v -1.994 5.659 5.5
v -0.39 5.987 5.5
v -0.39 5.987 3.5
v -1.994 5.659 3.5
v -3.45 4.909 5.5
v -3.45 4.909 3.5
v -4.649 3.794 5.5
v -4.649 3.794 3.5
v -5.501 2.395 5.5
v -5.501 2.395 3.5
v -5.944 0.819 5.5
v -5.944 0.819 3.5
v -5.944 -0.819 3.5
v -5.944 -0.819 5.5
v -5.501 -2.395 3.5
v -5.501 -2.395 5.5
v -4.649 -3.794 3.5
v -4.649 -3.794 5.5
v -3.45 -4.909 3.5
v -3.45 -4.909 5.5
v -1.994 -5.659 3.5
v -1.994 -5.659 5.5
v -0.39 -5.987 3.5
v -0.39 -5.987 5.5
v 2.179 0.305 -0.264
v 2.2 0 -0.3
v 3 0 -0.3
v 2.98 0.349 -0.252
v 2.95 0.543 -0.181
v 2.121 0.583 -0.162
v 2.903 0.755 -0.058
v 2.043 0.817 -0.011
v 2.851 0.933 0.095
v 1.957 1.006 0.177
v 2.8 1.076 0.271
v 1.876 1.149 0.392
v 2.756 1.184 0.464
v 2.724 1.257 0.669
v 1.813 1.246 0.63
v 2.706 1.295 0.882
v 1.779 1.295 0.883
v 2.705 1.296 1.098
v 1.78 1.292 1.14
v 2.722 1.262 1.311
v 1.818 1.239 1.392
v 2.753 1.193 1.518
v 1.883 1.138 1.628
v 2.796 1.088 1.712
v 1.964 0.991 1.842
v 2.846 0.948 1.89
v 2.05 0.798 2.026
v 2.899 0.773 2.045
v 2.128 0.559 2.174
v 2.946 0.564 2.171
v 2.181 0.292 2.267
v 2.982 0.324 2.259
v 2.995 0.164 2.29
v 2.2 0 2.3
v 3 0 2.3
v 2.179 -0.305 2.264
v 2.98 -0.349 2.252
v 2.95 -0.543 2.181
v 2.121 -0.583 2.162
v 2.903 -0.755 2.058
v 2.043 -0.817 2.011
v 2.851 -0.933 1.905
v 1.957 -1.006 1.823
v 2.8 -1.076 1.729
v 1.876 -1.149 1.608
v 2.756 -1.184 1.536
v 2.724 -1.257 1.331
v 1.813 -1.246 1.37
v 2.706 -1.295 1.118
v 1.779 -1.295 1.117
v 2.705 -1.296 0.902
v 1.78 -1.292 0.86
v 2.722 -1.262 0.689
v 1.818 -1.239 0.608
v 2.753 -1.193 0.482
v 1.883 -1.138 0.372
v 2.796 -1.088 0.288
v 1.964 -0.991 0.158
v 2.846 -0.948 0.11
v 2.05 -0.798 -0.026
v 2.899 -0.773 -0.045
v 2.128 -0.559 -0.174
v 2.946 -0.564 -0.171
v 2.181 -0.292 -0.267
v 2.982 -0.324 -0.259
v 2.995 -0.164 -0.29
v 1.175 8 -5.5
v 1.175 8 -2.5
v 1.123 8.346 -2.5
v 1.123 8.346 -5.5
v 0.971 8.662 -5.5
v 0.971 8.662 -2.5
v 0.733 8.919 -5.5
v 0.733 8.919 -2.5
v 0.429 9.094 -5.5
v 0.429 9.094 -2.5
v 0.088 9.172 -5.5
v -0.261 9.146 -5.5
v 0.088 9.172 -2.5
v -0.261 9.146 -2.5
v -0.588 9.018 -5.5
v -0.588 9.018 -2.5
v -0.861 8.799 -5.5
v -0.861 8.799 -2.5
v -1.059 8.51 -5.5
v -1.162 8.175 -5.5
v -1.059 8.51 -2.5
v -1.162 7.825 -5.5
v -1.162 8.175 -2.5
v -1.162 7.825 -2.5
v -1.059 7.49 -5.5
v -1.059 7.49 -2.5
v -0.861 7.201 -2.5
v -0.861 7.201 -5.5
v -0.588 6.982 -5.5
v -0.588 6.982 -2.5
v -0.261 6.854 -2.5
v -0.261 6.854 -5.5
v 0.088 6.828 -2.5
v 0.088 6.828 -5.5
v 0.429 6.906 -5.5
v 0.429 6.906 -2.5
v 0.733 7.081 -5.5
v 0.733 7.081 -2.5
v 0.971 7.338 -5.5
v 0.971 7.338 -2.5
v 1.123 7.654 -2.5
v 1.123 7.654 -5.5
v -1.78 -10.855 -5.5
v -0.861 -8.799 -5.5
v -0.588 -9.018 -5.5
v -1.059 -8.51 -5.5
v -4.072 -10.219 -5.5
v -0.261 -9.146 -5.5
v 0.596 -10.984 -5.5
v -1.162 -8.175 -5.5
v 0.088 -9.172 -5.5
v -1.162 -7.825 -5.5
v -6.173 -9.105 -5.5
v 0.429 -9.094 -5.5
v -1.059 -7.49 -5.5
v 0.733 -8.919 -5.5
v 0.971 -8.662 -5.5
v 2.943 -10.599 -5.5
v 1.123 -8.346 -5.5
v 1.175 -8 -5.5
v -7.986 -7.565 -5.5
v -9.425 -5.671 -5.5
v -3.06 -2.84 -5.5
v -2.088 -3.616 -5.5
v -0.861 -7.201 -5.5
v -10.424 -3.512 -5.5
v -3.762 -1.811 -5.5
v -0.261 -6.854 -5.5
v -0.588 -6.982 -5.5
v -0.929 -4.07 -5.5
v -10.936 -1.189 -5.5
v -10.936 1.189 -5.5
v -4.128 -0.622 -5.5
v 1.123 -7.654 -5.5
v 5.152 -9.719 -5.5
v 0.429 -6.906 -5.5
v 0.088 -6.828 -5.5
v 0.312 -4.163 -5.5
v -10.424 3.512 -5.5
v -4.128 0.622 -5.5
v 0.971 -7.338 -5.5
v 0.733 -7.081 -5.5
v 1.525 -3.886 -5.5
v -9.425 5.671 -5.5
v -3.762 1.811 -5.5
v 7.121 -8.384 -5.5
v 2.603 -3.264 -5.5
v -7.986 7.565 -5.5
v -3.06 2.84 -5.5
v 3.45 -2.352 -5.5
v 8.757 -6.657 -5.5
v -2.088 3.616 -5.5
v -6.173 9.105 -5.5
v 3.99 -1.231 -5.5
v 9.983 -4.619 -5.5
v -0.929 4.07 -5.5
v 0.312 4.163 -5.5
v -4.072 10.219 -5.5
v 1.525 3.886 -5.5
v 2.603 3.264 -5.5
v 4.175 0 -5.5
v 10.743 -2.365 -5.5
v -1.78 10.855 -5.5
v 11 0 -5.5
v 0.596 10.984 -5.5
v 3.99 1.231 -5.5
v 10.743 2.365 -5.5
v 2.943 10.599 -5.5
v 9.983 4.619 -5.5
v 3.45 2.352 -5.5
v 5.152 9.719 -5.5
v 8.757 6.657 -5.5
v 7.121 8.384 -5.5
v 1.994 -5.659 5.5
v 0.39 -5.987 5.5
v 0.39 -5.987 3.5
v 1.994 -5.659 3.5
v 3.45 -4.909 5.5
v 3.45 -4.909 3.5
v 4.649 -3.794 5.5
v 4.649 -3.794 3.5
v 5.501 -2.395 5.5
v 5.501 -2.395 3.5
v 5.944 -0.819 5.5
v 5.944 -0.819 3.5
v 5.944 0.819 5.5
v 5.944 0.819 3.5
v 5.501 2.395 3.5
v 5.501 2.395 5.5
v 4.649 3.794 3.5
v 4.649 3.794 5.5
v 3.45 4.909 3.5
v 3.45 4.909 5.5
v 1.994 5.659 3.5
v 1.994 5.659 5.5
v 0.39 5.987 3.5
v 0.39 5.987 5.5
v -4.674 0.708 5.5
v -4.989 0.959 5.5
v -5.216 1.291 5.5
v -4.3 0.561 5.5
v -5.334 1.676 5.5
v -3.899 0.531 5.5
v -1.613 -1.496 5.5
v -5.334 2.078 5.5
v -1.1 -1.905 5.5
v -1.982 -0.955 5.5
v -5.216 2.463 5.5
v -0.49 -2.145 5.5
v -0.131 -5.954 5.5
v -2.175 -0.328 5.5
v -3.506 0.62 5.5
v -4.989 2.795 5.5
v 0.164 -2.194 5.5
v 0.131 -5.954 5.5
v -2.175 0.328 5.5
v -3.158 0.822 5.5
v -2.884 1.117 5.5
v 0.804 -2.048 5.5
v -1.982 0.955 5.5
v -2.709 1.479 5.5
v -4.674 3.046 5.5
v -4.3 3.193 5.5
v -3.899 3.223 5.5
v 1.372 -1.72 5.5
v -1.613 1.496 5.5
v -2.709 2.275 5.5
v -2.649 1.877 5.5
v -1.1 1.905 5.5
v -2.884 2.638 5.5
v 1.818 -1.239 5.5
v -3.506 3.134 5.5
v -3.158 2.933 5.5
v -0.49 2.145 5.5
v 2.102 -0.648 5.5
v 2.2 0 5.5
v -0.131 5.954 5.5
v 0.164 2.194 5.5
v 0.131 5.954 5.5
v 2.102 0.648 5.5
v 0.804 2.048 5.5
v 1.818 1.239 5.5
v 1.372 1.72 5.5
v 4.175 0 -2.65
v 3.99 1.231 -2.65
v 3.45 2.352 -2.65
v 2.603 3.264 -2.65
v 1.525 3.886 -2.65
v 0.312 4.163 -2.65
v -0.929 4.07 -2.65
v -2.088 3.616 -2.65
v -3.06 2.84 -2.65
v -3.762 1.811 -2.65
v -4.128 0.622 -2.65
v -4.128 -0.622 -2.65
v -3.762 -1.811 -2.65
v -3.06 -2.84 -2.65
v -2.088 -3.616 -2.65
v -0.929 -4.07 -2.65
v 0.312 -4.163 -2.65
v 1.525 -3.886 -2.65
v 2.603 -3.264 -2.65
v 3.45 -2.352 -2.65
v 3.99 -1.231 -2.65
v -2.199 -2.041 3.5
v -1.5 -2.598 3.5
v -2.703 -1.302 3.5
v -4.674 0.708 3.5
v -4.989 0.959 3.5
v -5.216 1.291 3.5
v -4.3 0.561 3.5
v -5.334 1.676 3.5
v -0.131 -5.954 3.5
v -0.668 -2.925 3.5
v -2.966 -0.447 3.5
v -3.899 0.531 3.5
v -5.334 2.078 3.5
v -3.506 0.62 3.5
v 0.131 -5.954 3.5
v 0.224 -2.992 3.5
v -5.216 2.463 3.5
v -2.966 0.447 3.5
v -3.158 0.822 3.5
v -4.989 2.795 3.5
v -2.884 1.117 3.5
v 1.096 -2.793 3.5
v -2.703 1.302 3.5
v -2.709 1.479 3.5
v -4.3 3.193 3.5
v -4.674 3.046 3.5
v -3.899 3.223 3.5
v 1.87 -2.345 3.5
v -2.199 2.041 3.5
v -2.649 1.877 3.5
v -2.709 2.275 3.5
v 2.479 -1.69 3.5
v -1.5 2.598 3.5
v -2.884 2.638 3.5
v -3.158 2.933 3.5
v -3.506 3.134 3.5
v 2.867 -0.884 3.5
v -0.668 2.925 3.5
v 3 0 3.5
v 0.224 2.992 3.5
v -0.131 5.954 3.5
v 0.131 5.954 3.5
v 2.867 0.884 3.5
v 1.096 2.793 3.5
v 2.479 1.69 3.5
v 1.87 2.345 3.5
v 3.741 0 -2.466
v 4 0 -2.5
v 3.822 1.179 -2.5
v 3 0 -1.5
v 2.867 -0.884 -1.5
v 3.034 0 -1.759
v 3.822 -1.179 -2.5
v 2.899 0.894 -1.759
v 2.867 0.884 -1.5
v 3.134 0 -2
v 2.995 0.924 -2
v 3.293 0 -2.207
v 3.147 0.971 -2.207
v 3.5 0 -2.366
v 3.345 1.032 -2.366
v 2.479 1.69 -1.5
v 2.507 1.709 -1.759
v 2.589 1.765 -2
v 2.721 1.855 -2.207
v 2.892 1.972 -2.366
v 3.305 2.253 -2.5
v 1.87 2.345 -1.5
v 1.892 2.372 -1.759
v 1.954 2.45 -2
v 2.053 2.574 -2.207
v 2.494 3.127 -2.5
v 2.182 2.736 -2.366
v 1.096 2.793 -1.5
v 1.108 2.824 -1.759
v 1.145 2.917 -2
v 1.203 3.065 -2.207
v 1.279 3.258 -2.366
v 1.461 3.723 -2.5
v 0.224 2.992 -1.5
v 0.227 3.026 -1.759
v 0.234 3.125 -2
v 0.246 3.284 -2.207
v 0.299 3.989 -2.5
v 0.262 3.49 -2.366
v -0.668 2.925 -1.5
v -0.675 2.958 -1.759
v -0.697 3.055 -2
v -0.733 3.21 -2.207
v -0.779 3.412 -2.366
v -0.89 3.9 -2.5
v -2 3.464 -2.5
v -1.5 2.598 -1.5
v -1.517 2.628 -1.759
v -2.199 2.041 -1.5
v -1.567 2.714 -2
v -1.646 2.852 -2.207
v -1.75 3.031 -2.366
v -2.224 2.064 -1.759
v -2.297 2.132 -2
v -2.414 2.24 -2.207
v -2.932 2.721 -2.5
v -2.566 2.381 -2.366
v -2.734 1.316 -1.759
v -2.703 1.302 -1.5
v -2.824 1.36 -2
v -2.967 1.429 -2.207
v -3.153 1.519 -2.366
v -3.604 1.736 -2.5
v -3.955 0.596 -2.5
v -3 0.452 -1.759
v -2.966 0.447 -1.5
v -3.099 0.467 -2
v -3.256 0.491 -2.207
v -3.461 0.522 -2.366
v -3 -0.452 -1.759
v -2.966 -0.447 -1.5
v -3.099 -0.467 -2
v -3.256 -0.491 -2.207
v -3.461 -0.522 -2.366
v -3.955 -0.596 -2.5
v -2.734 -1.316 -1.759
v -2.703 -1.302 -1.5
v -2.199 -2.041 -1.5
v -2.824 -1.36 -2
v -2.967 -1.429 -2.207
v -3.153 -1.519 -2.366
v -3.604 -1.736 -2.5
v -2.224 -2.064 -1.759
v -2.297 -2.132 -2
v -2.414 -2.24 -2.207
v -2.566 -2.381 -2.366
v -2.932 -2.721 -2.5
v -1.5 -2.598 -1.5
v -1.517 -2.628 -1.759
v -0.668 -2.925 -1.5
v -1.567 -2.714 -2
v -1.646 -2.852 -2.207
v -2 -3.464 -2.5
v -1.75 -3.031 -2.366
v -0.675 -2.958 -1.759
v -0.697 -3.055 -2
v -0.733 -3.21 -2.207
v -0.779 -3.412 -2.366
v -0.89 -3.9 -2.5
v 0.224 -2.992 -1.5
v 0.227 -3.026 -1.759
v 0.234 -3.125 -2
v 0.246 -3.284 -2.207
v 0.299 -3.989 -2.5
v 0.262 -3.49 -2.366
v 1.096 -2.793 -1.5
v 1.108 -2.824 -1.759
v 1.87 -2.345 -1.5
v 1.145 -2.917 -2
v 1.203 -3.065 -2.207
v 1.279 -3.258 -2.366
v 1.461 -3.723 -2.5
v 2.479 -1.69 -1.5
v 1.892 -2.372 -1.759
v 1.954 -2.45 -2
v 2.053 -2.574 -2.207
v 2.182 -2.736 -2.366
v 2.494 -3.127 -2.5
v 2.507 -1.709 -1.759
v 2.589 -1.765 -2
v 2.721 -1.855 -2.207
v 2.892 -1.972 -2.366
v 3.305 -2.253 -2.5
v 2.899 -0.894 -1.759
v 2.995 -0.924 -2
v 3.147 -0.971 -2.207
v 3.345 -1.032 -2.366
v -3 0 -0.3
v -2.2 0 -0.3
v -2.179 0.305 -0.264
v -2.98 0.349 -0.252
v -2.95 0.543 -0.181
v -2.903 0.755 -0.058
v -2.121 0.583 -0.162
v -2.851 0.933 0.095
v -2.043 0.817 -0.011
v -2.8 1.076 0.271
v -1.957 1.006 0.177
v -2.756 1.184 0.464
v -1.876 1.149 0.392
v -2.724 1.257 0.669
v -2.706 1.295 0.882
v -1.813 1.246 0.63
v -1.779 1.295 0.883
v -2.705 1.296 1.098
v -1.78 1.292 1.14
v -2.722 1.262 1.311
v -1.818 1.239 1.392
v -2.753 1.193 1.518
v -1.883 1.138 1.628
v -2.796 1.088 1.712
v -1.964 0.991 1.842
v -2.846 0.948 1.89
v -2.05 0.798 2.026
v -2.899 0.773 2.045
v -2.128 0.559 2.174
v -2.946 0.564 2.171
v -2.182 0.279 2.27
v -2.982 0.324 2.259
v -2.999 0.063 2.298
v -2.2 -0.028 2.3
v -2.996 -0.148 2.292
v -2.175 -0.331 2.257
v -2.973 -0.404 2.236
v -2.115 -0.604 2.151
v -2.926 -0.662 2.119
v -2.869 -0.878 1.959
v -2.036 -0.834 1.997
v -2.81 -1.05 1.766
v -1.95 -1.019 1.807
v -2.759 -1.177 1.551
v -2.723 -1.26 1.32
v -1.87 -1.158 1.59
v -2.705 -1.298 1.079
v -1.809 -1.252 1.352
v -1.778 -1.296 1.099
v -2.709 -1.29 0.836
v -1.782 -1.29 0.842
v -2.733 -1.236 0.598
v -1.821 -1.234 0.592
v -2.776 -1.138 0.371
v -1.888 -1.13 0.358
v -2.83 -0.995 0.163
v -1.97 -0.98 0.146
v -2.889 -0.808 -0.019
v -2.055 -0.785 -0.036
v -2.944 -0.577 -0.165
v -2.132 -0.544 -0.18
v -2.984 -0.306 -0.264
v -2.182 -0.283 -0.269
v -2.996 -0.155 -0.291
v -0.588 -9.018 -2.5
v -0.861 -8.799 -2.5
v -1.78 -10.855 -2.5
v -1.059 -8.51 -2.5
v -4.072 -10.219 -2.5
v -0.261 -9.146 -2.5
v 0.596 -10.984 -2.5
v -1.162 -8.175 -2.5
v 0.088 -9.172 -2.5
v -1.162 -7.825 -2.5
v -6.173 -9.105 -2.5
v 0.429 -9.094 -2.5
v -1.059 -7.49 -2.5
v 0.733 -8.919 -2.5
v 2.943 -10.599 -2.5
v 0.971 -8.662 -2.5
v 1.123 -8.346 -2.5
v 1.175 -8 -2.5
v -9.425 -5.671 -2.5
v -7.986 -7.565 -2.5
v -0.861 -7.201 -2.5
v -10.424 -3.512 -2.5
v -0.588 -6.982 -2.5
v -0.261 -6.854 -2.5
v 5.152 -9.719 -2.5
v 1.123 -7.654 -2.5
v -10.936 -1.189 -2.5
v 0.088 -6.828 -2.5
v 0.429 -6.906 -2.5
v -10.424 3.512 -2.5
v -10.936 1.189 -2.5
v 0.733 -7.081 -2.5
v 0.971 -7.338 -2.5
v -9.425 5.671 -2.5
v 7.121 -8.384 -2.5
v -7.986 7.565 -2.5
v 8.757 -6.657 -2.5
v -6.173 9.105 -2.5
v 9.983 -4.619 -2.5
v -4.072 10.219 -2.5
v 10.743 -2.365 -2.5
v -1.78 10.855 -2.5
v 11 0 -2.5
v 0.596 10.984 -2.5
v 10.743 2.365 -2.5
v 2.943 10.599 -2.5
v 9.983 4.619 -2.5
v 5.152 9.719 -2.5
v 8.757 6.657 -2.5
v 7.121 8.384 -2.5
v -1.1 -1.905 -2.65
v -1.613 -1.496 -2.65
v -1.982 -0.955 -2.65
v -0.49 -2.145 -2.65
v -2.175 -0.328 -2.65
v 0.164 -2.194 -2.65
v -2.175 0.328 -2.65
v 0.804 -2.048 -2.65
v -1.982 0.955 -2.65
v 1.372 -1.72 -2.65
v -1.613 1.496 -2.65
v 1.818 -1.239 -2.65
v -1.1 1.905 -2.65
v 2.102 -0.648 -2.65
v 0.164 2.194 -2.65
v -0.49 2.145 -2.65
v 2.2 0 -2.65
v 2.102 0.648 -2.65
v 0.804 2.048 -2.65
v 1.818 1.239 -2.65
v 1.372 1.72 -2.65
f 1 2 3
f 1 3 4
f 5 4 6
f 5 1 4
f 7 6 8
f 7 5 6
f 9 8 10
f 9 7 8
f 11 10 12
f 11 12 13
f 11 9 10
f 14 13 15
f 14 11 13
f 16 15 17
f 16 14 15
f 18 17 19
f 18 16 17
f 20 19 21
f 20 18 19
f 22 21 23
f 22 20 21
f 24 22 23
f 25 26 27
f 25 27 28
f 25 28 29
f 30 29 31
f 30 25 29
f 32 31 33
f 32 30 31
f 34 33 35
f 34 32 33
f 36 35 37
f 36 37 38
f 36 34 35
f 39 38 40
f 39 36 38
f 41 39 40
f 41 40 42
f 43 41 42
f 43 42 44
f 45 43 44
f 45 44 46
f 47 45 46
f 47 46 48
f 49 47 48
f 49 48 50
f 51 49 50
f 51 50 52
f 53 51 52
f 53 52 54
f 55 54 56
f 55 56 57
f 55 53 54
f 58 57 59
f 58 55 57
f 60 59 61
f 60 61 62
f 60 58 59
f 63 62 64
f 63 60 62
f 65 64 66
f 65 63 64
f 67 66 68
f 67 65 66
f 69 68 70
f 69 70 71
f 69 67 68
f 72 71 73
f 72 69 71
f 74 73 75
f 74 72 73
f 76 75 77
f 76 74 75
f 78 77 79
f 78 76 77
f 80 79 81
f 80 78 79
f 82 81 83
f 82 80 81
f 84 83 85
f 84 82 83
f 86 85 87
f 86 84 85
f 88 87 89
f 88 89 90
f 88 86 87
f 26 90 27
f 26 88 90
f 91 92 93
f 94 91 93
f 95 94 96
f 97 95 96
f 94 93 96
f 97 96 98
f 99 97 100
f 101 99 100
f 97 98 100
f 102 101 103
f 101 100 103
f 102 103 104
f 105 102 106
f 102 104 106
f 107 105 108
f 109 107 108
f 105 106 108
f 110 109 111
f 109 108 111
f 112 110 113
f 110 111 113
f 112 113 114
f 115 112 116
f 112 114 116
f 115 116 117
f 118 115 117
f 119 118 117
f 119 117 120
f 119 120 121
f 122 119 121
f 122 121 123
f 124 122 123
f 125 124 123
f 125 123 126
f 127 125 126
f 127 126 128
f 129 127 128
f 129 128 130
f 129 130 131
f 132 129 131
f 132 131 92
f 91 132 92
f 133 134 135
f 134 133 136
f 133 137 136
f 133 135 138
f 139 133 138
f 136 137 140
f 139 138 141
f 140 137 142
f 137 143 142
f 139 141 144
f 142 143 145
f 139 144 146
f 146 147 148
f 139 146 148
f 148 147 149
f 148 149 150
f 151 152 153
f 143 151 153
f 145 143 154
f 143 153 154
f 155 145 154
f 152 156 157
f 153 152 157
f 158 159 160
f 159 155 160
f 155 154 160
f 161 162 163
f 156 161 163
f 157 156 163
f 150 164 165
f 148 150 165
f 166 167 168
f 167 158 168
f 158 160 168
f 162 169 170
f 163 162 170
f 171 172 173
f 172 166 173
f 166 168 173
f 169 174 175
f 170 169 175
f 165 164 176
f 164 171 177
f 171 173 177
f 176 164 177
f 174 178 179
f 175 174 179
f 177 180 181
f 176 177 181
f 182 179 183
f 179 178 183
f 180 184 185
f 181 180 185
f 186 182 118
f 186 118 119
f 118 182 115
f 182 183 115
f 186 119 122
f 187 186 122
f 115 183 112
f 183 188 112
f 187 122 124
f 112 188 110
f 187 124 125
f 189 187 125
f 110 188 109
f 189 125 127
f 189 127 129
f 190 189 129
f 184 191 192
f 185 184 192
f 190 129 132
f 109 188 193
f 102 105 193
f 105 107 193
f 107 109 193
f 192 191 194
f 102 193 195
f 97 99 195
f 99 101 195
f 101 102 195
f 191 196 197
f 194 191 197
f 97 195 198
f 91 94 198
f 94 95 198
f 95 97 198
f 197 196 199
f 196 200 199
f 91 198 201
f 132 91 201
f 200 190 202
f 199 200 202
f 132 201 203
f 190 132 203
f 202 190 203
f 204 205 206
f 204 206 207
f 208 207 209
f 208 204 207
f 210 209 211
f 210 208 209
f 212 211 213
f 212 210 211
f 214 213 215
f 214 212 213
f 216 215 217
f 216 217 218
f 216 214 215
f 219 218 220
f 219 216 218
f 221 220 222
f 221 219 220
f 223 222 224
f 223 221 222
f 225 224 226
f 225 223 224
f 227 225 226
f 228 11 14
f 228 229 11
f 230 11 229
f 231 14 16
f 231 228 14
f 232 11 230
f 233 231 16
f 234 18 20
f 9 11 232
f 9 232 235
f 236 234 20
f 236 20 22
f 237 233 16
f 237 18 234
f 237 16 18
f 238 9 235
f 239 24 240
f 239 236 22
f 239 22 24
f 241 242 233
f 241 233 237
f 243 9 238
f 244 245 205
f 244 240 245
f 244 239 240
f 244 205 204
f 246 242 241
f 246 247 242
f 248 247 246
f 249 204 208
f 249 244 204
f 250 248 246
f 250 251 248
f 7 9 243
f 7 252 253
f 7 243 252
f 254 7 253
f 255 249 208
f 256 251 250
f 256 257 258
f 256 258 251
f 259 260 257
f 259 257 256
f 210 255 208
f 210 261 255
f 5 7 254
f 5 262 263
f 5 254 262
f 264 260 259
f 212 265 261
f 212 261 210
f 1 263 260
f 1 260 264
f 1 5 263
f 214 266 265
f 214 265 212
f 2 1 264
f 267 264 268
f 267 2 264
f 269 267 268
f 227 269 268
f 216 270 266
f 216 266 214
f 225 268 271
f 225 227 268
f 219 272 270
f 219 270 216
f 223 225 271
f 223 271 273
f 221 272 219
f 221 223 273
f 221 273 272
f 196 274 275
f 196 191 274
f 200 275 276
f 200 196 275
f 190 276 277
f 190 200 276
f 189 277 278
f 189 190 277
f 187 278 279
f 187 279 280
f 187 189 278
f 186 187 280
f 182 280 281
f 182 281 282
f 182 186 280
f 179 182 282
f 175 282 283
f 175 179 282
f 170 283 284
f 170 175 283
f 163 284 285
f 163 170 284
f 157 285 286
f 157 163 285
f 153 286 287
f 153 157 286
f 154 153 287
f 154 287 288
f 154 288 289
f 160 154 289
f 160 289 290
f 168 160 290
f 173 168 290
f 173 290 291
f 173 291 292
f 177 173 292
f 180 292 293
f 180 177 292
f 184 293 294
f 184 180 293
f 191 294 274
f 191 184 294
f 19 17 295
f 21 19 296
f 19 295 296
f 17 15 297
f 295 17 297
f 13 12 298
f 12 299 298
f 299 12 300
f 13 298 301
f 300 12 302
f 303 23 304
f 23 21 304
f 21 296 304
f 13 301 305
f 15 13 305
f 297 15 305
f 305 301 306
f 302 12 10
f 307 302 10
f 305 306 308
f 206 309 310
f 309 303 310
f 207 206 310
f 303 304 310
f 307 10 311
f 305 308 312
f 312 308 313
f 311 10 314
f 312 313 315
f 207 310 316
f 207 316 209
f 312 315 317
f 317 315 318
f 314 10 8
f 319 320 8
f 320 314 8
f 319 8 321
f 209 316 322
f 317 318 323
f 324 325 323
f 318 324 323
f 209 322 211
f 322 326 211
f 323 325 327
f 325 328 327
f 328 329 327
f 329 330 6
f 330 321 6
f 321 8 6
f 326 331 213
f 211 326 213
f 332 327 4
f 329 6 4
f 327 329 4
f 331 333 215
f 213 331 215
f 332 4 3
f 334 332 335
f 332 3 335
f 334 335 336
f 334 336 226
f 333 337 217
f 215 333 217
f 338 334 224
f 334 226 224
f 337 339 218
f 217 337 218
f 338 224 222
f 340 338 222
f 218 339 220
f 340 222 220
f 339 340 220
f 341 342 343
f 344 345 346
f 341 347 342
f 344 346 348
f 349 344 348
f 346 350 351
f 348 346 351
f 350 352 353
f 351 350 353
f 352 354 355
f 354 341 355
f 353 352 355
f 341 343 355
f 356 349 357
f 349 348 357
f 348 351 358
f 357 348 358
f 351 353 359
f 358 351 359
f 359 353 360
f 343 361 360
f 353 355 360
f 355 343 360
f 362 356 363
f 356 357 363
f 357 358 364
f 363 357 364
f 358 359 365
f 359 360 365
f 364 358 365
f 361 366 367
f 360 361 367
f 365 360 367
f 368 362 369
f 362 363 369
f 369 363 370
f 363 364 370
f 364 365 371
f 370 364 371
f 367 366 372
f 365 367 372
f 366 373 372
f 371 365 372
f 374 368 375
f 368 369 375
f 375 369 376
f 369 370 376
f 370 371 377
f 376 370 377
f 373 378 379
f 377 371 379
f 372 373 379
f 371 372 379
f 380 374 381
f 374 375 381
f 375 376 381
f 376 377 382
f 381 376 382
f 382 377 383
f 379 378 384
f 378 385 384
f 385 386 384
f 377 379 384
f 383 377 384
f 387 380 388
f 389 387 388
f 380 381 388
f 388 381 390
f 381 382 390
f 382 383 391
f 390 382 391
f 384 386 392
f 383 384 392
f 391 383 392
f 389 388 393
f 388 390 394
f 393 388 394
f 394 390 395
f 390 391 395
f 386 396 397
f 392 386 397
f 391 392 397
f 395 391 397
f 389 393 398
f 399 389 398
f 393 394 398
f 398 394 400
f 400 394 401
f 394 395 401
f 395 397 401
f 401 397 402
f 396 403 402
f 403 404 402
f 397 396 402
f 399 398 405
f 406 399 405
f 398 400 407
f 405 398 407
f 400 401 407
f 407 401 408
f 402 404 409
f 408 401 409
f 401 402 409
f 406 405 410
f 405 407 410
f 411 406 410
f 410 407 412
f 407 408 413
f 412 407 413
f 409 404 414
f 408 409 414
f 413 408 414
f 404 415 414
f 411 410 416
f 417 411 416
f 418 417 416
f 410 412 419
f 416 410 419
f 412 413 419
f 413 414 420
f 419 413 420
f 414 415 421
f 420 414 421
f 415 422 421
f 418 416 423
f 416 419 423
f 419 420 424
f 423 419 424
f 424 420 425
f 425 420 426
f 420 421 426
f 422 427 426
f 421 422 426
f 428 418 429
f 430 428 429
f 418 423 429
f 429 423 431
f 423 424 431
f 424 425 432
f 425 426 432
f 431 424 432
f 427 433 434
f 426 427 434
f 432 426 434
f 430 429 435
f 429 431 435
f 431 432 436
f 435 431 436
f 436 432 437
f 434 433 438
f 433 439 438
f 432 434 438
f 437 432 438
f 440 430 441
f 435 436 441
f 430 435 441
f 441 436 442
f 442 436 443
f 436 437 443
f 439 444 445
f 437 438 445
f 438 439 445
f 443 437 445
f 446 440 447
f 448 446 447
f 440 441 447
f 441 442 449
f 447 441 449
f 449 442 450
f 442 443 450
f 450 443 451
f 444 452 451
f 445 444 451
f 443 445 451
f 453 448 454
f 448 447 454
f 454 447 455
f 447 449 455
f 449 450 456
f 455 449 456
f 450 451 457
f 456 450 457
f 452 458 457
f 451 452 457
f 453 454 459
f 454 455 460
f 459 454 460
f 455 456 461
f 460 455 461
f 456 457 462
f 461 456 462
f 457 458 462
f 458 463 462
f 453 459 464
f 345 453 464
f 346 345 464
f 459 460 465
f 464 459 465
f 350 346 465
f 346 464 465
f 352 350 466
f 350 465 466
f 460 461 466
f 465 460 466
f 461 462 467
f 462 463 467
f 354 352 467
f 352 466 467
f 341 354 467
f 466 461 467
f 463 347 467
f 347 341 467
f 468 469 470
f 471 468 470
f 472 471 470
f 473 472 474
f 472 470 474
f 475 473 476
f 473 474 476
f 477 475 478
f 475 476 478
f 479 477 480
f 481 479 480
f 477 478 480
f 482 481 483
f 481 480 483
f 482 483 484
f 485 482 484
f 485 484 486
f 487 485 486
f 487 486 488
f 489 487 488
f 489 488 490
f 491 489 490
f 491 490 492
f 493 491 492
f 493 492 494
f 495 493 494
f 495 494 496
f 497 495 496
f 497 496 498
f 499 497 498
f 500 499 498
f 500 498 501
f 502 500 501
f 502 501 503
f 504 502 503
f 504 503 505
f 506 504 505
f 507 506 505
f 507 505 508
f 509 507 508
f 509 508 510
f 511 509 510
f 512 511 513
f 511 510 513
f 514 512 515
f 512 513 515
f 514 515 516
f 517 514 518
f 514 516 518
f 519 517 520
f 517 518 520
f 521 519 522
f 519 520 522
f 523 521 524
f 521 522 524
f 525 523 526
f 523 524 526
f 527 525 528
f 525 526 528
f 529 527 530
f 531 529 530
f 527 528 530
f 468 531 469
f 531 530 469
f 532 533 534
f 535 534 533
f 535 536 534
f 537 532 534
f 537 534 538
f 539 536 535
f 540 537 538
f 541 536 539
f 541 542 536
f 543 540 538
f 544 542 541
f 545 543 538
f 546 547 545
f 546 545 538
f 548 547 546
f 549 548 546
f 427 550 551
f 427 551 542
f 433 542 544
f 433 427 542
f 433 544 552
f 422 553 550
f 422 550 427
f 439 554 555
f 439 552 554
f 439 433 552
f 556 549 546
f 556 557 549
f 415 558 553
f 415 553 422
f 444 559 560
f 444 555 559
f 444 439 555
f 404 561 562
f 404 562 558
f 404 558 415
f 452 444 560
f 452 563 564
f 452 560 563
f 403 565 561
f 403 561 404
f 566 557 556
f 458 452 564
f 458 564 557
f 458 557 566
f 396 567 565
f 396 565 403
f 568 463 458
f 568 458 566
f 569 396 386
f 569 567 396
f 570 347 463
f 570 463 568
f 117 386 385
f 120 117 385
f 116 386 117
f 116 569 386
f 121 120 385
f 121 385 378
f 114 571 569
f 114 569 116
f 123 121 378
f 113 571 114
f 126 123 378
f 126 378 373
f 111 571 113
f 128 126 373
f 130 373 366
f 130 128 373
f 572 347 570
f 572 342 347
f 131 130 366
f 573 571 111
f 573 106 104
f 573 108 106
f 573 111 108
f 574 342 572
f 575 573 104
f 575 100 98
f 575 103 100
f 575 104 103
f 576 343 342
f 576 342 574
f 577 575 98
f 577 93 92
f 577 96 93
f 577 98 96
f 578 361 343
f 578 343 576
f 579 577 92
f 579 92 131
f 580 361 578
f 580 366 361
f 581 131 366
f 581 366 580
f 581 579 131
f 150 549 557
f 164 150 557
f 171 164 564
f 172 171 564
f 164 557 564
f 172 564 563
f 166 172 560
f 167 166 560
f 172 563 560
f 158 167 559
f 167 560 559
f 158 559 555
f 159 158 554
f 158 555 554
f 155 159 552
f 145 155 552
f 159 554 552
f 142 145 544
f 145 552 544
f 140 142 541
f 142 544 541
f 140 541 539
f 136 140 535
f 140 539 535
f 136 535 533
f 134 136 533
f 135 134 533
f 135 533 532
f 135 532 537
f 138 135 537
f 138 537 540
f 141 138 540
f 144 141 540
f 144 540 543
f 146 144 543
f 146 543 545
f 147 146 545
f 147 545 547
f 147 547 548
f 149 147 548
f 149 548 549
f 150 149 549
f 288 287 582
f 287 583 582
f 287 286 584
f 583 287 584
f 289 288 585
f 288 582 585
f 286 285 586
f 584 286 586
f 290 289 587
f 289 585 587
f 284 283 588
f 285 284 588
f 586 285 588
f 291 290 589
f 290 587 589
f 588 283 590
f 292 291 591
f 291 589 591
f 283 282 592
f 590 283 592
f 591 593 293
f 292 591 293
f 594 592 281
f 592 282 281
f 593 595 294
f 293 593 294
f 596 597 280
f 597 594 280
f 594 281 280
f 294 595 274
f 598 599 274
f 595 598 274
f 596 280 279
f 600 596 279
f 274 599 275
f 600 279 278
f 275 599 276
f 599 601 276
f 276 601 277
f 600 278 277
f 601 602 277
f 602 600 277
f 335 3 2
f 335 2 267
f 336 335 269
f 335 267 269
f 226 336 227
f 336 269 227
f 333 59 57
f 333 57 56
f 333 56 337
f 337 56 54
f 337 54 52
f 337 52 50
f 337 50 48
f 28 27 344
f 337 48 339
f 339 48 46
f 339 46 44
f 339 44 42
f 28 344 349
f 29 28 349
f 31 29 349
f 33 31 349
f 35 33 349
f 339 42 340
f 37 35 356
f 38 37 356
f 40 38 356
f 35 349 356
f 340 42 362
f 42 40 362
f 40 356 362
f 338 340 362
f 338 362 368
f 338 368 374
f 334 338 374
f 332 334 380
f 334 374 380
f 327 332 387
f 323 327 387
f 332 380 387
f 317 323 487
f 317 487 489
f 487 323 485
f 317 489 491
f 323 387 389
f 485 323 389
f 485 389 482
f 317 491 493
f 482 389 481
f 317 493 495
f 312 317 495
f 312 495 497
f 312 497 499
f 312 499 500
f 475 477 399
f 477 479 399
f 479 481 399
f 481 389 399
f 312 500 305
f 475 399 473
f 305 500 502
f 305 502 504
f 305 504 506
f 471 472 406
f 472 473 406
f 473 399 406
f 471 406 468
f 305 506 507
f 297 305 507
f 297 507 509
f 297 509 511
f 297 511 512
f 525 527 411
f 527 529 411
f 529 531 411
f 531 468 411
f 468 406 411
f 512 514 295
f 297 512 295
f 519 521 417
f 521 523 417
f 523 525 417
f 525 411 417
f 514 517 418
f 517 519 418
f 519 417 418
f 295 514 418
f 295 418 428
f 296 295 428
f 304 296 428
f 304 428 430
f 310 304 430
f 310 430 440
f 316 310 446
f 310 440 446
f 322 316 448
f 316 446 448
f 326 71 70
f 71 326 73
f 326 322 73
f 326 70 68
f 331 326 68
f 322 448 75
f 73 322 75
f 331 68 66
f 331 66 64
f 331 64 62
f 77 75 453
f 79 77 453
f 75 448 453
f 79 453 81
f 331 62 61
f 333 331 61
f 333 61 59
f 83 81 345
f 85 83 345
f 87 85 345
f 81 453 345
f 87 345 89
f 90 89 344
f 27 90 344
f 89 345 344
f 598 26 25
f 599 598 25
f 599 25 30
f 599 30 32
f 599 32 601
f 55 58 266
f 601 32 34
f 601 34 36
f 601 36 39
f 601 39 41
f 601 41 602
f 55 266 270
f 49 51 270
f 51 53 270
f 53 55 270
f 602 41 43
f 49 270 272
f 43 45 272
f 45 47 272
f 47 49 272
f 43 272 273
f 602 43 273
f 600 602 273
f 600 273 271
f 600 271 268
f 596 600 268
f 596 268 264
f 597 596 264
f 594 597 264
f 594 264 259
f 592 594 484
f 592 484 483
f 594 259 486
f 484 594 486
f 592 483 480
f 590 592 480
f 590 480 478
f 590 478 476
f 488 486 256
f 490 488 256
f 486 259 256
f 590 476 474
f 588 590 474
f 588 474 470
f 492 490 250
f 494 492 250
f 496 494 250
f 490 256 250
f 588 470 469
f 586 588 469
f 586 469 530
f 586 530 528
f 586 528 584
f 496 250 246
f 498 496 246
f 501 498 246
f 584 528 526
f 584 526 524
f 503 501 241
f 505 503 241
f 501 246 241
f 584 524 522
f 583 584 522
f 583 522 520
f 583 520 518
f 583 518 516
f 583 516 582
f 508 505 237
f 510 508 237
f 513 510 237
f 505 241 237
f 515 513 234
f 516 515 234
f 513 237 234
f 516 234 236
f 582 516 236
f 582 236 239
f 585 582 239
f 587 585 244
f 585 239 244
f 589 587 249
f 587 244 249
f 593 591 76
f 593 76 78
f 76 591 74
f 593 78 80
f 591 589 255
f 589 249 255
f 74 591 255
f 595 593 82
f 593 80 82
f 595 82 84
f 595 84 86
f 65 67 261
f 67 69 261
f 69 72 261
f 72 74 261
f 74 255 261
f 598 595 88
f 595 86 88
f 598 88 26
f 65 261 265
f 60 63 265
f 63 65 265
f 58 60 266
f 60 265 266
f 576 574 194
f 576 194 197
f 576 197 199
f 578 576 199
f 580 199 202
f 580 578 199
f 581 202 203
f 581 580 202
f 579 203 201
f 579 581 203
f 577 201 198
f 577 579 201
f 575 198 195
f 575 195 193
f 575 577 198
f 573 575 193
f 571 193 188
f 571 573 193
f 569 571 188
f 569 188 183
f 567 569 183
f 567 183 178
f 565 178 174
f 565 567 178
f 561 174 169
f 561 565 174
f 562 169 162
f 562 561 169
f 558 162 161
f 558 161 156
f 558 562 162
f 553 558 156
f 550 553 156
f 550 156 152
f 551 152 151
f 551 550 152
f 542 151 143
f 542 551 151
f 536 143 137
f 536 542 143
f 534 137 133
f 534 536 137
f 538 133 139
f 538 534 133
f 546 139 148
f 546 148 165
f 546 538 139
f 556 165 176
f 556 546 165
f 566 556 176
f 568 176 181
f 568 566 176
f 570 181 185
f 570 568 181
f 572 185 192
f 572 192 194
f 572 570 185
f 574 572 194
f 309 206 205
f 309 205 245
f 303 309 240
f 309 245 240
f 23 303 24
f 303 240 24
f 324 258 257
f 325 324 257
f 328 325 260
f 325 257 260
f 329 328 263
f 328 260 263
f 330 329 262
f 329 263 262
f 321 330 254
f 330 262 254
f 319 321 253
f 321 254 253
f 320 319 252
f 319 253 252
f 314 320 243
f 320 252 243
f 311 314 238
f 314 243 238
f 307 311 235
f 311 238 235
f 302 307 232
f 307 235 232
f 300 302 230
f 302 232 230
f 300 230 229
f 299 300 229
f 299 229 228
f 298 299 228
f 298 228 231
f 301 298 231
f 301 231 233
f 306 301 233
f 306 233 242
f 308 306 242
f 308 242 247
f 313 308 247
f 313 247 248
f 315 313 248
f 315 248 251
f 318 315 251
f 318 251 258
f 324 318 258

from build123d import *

# Parameters (mm, degrees)
SKETCH1_R                = 11
SKETCH1_R_2              = 4.175
MAIN_BODY_DEPTH          = 5.5
SKETCH2_R                = 4.175
SKETCH2_R_2              = 2.2
MAIN_BOLT_SURFACE_DEPTH  = 8.15
SKETCH7_R                = 1.175
CUT_EXTRUDE4_DEPTH       = 12
SKETCH8_R                = 2.05
CUT_EXTRUDE5_DEPTH       = 2
CUT_EXTRUDE9_START       = -2.5
SKETCH11_R               = 11
SKETCH11_R_2             = 3
CUT_EXTRUDE9_DEPTH       = 6
CUT_EXTRUDE10_REACH      = 13
SKETCH10_R               = 11
SKETCH10_R_2             = 6
FILLET2_R                = 1
SKETCH12_R               = 1.3
CUT_EXTRUDE12_DEPTH      = 12
CUT_EXTRUDE12_DEPTH_BACK = 12
SKETCH13_R               = 1.35
CUT_EXTRUDE13_DEPTH      = 5.5


with BuildPart() as part:
    # Sketch1 → Main Body (new body, symmetric)
    with BuildSketch(Plane.XY):
        Circle(SKETCH1_R)
        Circle(SKETCH1_R_2, mode=Mode.SUBTRACT)
    extrude(amount=MAIN_BODY_DEPTH, both=True)

    # Sketch2 → Main Bolt Surface (add)
    with BuildSketch(Plane.XY.offset(5.5)):
        Circle(SKETCH2_R)
        Circle(SKETCH2_R_2, mode=Mode.SUBTRACT)
    extrude(amount=-MAIN_BOLT_SURFACE_DEPTH)

    # Sketch7 → Cut-Extrude4 (cut, through all)
    with BuildSketch(Plane.XY.offset(5.5)):
        with Locations((0, -8)):
            Circle(SKETCH7_R)
        with Locations((0, 8)):
            Circle(SKETCH7_R)
    extrude(amount=-CUT_EXTRUDE4_DEPTH, mode=Mode.SUBTRACT)

    # Sketch8 → Cut-Extrude5 (cut)
    with BuildSketch(Plane.XY.offset(5.5)):
        with Locations((0, 8)):
            Circle(SKETCH8_R)
        with Locations((0, -8)):
            Circle(SKETCH8_R)
    extrude(amount=-CUT_EXTRUDE5_DEPTH, mode=Mode.SUBTRACT)

    # Sketch11 → Cut-Extrude9 (cut)
    with BuildSketch(Plane.XY.offset(CUT_EXTRUDE9_START)):
        Circle(SKETCH11_R)
        Circle(SKETCH11_R_2, mode=Mode.SUBTRACT)
    extrude(amount=CUT_EXTRUDE9_DEPTH, mode=Mode.SUBTRACT)

    # Sketch10 → Cut-Extrude10 (cut, up to next)
    with BuildSketch(Plane.XY.offset(5.5), mode=Mode.PRIVATE) as cut_extrude10_sk1:
        Circle(SKETCH10_R)
        Circle(SKETCH10_R_2, mode=Mode.SUBTRACT)
    cut_extrude10_tool1 = extrude(cut_extrude10_sk1.sketch, amount=-CUT_EXTRUDE10_REACH, mode=Mode.PRIVATE) & part.part
    add(cut_extrude10_tool1.solids().sort_by_distance((-10.688873, 0, 5.5))[0], mode=Mode.SUBTRACT)

    # Fillet2
    fillet2_edges = [part.edges().sort_by_distance(p)[0] for p in [
        (-3, 0, -2.5),
    ]]
    fillet(fillet2_edges, radius=FILLET2_R)

    # Sketch12 → Cut-Extrude12 (cut, two sides)
    with BuildSketch(Plane(origin=(0, 0, 0), x_dir=(0, 0, -1), z_dir=(1, 0, 0))) as cut_extrude12_sk:
        with Locations((-1, 0)):
            Circle(SKETCH12_R)
    extrude(amount=CUT_EXTRUDE12_DEPTH, mode=Mode.SUBTRACT)
    extrude(cut_extrude12_sk.sketch, amount=-CUT_EXTRUDE12_DEPTH_BACK, mode=Mode.SUBTRACT)

    # Sketch13 → Cut-Extrude13 (cut)
    with BuildSketch(Plane.XY.offset(5.5)):
        with Locations((-3.999386509, 1.877034489)):
            Circle(SKETCH13_R)
    extrude(amount=-CUT_EXTRUDE13_DEPTH, mode=Mode.SUBTRACT)


solid = part.part
